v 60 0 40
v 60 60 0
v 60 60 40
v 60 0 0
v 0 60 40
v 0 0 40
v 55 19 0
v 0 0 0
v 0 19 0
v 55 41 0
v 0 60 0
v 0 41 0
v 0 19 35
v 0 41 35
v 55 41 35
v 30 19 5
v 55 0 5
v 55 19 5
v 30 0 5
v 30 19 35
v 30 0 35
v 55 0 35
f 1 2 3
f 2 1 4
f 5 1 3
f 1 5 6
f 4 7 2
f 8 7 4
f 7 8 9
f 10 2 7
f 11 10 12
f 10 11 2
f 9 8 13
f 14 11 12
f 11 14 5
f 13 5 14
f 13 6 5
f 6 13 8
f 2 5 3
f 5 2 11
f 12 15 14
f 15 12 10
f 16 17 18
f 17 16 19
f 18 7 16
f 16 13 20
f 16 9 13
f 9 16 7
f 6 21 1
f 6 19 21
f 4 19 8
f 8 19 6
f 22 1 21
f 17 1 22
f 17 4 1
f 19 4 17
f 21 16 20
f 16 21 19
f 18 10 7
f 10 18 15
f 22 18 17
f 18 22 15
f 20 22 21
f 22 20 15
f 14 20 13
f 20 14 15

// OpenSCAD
translate([0,60-19,0]) cube([60,19,40]);
cube([60,19,5]);
cube([30,19,40]);
translate([60-5,0,0]) cube([5,60,40]);
translate([0,0,40-5]) cube([60,60,5]);
